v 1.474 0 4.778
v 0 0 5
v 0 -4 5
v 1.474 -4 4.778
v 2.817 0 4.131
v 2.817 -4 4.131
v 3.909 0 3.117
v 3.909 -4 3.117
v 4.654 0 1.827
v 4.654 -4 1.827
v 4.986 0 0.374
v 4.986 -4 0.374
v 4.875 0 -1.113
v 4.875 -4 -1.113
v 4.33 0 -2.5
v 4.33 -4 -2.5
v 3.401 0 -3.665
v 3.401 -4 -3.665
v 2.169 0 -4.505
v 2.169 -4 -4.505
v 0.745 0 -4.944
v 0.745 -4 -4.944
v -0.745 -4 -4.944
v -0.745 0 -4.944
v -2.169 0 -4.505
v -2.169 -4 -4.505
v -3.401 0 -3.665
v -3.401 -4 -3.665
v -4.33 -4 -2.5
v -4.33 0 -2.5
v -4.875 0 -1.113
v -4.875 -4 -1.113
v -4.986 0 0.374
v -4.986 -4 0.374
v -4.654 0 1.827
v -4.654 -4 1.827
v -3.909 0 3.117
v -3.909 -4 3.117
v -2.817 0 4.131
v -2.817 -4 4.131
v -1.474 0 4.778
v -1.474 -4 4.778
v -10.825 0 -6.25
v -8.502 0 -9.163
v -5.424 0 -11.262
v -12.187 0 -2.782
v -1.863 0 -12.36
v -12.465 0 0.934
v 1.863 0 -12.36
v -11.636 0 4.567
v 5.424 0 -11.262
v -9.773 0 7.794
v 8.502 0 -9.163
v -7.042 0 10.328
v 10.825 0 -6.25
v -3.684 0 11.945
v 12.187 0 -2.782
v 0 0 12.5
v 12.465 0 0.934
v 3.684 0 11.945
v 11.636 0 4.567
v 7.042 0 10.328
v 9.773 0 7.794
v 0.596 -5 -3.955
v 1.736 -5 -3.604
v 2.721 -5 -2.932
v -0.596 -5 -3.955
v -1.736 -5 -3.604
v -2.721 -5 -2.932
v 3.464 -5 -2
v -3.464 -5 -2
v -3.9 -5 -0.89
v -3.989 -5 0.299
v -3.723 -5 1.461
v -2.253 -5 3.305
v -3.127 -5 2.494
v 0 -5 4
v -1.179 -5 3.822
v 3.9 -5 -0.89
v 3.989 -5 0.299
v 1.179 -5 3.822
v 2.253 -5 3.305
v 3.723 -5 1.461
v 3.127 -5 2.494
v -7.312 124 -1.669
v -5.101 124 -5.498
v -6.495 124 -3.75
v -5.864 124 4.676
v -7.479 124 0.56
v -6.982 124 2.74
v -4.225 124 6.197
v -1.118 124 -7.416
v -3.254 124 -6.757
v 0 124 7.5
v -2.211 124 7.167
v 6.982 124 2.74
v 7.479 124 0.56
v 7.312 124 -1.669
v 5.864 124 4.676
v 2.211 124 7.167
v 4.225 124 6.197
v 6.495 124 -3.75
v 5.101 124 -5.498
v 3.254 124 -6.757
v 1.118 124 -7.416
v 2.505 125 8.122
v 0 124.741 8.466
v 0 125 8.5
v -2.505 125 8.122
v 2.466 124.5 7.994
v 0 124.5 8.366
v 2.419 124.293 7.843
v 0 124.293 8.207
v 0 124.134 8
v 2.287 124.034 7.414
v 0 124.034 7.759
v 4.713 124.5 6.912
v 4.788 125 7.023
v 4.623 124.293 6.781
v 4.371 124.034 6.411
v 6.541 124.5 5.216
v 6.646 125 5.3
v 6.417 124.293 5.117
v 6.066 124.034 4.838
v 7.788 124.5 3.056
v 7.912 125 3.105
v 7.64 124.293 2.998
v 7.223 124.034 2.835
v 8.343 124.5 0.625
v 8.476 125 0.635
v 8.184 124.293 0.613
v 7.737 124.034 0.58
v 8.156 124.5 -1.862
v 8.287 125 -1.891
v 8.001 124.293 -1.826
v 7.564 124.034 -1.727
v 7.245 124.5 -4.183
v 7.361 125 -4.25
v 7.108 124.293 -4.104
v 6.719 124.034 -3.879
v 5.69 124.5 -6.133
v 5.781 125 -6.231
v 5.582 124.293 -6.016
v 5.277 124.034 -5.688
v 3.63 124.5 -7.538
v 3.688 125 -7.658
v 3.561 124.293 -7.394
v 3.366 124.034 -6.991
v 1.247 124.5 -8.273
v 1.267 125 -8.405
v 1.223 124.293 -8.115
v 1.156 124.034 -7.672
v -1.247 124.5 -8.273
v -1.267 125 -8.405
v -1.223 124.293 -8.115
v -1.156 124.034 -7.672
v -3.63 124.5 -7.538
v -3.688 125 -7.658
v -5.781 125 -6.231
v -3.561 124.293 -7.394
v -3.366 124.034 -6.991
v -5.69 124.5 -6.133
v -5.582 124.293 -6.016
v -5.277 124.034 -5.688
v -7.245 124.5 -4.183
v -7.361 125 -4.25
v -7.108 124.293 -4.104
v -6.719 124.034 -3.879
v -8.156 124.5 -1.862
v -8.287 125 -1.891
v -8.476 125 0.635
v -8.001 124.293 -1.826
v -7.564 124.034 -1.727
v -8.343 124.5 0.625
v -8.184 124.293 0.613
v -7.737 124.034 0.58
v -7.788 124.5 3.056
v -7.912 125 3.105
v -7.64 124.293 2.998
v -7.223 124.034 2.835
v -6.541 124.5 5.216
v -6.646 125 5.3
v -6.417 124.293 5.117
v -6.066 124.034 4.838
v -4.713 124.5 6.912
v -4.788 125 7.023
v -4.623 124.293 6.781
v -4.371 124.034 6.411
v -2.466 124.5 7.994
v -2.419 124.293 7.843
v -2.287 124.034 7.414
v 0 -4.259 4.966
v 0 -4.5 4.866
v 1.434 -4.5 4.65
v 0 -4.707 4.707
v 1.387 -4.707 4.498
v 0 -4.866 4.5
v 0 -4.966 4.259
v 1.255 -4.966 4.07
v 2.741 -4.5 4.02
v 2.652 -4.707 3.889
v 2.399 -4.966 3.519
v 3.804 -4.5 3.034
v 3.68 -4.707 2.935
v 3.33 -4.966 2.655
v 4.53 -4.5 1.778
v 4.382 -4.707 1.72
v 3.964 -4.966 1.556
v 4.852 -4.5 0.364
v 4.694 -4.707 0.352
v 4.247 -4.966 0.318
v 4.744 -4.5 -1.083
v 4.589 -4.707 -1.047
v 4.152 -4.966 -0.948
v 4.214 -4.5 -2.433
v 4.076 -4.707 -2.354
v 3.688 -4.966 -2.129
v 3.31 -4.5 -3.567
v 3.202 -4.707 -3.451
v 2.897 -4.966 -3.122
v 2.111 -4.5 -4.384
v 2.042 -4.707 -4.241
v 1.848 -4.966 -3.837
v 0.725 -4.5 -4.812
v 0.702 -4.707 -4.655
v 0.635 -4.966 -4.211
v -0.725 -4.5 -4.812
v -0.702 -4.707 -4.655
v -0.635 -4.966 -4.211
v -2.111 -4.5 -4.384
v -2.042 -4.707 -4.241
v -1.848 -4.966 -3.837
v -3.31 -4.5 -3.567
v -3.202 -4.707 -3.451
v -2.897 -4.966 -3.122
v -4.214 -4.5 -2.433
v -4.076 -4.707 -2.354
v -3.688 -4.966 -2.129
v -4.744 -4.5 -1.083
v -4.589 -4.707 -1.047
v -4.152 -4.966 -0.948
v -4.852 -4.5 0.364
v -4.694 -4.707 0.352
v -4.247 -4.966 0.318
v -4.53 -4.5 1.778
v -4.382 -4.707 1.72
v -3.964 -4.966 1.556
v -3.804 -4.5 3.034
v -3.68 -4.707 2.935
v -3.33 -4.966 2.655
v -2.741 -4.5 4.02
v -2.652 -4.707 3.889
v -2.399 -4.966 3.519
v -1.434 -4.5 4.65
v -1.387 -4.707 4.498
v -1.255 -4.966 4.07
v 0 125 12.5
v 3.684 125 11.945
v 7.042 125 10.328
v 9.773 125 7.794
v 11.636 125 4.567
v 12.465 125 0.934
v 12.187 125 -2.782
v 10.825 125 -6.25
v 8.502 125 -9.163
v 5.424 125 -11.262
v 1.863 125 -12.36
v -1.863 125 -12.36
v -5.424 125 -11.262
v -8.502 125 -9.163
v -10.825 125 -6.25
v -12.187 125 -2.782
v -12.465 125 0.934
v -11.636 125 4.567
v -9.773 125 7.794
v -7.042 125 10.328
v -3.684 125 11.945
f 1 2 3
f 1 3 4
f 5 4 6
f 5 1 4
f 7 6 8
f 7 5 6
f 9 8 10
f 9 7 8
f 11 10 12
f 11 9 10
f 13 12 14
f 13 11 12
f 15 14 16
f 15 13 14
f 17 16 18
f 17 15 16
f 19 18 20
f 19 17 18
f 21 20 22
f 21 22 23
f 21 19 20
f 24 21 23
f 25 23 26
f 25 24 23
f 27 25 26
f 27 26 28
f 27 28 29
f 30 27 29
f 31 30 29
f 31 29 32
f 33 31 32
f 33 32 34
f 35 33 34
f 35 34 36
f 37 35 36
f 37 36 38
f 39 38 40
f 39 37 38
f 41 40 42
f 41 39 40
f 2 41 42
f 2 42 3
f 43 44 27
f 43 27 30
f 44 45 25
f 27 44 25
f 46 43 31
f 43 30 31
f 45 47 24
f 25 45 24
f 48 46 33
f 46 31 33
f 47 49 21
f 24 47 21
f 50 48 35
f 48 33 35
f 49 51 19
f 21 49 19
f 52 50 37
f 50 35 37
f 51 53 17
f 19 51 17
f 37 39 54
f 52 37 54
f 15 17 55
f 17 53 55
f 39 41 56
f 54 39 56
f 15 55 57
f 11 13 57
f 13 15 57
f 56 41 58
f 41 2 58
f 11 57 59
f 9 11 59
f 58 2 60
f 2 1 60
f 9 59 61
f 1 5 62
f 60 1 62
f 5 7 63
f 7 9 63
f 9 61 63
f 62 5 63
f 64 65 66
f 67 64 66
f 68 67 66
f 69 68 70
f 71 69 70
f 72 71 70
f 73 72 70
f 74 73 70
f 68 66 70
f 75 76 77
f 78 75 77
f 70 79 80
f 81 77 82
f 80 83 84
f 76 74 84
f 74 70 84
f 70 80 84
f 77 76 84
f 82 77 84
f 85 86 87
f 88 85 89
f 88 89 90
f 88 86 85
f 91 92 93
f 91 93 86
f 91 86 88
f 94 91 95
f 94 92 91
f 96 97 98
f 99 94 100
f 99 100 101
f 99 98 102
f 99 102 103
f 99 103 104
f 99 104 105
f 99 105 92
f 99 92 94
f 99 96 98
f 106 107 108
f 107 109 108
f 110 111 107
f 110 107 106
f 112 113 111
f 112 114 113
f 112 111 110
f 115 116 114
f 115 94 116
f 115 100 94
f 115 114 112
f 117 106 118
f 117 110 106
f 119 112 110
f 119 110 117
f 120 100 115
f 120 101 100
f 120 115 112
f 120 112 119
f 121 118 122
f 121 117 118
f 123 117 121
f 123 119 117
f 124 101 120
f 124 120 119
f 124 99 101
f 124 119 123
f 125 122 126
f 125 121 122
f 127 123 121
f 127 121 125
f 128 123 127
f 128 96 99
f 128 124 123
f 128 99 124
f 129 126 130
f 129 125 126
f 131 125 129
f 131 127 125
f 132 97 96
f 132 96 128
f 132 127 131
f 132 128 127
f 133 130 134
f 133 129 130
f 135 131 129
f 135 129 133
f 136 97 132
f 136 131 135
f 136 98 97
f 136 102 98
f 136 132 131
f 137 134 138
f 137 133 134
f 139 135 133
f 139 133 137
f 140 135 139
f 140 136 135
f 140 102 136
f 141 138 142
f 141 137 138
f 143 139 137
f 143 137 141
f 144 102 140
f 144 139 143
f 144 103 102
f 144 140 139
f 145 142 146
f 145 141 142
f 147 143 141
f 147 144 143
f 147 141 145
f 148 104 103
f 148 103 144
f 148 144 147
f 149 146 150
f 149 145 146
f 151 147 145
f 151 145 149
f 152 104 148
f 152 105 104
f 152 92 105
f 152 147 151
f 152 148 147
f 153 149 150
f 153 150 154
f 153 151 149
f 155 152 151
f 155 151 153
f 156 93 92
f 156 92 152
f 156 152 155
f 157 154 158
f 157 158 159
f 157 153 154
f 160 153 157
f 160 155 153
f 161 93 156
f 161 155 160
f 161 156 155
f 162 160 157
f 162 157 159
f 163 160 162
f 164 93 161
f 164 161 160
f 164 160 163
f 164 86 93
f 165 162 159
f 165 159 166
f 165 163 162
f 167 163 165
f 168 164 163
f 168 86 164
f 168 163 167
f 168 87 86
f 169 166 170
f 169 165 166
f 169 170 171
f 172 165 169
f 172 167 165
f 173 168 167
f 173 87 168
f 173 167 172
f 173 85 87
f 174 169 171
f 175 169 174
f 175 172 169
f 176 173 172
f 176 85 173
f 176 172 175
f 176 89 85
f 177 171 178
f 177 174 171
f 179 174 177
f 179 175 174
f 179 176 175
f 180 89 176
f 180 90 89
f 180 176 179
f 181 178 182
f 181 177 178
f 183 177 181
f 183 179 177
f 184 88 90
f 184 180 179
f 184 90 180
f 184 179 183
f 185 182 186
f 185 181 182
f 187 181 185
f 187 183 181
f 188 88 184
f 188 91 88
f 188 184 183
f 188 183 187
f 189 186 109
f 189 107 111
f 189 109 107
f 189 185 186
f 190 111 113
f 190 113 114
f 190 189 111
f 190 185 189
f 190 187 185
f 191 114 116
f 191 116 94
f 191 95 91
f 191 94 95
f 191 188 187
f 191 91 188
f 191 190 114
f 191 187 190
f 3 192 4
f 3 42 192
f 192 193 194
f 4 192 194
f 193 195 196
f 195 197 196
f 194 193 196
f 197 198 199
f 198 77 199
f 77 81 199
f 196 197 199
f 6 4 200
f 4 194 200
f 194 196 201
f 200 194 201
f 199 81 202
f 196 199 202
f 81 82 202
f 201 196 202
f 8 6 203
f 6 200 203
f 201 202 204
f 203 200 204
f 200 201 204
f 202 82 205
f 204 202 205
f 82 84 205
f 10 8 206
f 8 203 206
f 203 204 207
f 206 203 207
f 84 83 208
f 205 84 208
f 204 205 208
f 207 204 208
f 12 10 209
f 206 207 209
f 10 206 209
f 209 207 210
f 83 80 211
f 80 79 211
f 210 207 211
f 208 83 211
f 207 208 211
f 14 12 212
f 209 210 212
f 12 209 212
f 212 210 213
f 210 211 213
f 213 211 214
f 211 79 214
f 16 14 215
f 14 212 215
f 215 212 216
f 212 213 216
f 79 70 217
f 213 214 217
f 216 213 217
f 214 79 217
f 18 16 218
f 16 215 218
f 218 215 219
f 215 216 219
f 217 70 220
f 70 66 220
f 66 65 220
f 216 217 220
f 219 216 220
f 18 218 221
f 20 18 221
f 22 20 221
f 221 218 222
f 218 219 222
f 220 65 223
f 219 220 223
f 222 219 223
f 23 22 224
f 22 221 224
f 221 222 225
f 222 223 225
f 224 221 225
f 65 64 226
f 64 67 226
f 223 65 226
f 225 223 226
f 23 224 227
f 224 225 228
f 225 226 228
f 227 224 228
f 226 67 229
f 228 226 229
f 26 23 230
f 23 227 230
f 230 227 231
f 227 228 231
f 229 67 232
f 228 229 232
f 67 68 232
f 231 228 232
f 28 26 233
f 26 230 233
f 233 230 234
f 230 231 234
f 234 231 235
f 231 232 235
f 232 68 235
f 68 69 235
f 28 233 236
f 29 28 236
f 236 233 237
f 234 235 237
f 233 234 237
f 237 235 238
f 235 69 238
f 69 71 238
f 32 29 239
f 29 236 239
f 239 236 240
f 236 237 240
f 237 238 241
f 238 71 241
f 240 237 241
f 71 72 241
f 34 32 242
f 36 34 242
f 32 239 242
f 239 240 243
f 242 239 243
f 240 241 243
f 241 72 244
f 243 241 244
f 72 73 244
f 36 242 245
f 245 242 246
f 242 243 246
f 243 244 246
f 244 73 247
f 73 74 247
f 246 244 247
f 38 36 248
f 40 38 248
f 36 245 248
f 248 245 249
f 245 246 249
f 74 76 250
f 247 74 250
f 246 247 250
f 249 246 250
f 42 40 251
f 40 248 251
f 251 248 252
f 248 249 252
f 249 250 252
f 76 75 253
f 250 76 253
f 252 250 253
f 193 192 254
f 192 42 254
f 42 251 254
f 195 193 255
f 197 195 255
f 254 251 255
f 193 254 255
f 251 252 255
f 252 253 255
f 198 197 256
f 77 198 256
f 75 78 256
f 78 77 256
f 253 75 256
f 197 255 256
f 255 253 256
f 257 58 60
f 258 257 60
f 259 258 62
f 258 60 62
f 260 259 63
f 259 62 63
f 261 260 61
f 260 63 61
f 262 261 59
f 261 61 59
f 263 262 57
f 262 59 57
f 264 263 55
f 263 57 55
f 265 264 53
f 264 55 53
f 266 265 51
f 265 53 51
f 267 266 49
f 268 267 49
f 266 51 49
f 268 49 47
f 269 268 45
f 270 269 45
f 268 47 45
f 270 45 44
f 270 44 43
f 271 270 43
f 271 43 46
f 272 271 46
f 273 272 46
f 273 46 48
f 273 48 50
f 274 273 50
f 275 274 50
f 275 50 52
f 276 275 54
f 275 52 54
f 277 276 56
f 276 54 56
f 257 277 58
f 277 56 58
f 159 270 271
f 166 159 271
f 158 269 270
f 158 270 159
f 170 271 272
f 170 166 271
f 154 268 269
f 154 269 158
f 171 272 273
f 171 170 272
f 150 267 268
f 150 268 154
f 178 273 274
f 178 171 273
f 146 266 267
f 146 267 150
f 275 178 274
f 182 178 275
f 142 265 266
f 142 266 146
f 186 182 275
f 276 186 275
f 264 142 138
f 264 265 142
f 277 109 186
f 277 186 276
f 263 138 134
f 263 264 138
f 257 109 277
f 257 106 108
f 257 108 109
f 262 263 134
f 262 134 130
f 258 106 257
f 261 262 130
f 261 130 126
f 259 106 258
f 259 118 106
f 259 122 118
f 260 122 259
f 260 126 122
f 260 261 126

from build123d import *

# Parameters (mm, degrees)
SKETCH_1_R          = 12.5
EXTRUDE_1_DEPTH     = 125
SKETCH_2_R          = 5
EXTRUDE_2_DEPTH     = 5
FILLET_1_R          = 1
SKETCH_3_R          = 8.5
CUT_EXTRUDE_1_DEPTH = 1
FILLET_2_R          = 1


with BuildPart() as part:
    # 草图1 → 凸台-拉伸1 (new body)
    with BuildSketch(Plane(origin=(0, 0, 0), x_dir=(1, 0, 0), z_dir=(0, 1, 0))):
        with Locations(Location((0, 0, 0), (0, 0, 270))):
            Circle(SKETCH_1_R)
    extrude(amount=EXTRUDE_1_DEPTH)

    # 草图2 → 凸台-拉伸2 (add)
    with BuildSketch(Plane(origin=(0, 0, 0), x_dir=(1, 0, 0), z_dir=(0, 1, 0))):
        with Locations(Location((0, 0, 0), (0, 0, 270))):
            Circle(SKETCH_2_R)
    extrude(amount=-EXTRUDE_2_DEPTH)

    # 圆角1
    fillet_1_edges = [part.edges().sort_by_distance(p)[0] for p in [
        (0, -5, -5),
    ]]
    fillet(fillet_1_edges, radius=FILLET_1_R)

    # 草图3 → 切除-拉伸1 (cut)
    with BuildSketch(Plane(origin=(0, 125, 0), x_dir=(1, 0, 0), z_dir=(0, 1, 0))):
        with Locations(Location((0, 0, 0), (0, 0, 270))):
            Circle(SKETCH_3_R)
    extrude(amount=-CUT_EXTRUDE_1_DEPTH, mode=Mode.SUBTRACT)

    # 圆角2
    fillet_2_edges = [part.edges().sort_by_distance(p)[0] for p in [
        (0, 124, -8.5),
    ]]
    fillet(fillet_2_edges, radius=FILLET_2_R - 0.0001)  # a hair under: the kernel refuses the full size


solid = part.part
